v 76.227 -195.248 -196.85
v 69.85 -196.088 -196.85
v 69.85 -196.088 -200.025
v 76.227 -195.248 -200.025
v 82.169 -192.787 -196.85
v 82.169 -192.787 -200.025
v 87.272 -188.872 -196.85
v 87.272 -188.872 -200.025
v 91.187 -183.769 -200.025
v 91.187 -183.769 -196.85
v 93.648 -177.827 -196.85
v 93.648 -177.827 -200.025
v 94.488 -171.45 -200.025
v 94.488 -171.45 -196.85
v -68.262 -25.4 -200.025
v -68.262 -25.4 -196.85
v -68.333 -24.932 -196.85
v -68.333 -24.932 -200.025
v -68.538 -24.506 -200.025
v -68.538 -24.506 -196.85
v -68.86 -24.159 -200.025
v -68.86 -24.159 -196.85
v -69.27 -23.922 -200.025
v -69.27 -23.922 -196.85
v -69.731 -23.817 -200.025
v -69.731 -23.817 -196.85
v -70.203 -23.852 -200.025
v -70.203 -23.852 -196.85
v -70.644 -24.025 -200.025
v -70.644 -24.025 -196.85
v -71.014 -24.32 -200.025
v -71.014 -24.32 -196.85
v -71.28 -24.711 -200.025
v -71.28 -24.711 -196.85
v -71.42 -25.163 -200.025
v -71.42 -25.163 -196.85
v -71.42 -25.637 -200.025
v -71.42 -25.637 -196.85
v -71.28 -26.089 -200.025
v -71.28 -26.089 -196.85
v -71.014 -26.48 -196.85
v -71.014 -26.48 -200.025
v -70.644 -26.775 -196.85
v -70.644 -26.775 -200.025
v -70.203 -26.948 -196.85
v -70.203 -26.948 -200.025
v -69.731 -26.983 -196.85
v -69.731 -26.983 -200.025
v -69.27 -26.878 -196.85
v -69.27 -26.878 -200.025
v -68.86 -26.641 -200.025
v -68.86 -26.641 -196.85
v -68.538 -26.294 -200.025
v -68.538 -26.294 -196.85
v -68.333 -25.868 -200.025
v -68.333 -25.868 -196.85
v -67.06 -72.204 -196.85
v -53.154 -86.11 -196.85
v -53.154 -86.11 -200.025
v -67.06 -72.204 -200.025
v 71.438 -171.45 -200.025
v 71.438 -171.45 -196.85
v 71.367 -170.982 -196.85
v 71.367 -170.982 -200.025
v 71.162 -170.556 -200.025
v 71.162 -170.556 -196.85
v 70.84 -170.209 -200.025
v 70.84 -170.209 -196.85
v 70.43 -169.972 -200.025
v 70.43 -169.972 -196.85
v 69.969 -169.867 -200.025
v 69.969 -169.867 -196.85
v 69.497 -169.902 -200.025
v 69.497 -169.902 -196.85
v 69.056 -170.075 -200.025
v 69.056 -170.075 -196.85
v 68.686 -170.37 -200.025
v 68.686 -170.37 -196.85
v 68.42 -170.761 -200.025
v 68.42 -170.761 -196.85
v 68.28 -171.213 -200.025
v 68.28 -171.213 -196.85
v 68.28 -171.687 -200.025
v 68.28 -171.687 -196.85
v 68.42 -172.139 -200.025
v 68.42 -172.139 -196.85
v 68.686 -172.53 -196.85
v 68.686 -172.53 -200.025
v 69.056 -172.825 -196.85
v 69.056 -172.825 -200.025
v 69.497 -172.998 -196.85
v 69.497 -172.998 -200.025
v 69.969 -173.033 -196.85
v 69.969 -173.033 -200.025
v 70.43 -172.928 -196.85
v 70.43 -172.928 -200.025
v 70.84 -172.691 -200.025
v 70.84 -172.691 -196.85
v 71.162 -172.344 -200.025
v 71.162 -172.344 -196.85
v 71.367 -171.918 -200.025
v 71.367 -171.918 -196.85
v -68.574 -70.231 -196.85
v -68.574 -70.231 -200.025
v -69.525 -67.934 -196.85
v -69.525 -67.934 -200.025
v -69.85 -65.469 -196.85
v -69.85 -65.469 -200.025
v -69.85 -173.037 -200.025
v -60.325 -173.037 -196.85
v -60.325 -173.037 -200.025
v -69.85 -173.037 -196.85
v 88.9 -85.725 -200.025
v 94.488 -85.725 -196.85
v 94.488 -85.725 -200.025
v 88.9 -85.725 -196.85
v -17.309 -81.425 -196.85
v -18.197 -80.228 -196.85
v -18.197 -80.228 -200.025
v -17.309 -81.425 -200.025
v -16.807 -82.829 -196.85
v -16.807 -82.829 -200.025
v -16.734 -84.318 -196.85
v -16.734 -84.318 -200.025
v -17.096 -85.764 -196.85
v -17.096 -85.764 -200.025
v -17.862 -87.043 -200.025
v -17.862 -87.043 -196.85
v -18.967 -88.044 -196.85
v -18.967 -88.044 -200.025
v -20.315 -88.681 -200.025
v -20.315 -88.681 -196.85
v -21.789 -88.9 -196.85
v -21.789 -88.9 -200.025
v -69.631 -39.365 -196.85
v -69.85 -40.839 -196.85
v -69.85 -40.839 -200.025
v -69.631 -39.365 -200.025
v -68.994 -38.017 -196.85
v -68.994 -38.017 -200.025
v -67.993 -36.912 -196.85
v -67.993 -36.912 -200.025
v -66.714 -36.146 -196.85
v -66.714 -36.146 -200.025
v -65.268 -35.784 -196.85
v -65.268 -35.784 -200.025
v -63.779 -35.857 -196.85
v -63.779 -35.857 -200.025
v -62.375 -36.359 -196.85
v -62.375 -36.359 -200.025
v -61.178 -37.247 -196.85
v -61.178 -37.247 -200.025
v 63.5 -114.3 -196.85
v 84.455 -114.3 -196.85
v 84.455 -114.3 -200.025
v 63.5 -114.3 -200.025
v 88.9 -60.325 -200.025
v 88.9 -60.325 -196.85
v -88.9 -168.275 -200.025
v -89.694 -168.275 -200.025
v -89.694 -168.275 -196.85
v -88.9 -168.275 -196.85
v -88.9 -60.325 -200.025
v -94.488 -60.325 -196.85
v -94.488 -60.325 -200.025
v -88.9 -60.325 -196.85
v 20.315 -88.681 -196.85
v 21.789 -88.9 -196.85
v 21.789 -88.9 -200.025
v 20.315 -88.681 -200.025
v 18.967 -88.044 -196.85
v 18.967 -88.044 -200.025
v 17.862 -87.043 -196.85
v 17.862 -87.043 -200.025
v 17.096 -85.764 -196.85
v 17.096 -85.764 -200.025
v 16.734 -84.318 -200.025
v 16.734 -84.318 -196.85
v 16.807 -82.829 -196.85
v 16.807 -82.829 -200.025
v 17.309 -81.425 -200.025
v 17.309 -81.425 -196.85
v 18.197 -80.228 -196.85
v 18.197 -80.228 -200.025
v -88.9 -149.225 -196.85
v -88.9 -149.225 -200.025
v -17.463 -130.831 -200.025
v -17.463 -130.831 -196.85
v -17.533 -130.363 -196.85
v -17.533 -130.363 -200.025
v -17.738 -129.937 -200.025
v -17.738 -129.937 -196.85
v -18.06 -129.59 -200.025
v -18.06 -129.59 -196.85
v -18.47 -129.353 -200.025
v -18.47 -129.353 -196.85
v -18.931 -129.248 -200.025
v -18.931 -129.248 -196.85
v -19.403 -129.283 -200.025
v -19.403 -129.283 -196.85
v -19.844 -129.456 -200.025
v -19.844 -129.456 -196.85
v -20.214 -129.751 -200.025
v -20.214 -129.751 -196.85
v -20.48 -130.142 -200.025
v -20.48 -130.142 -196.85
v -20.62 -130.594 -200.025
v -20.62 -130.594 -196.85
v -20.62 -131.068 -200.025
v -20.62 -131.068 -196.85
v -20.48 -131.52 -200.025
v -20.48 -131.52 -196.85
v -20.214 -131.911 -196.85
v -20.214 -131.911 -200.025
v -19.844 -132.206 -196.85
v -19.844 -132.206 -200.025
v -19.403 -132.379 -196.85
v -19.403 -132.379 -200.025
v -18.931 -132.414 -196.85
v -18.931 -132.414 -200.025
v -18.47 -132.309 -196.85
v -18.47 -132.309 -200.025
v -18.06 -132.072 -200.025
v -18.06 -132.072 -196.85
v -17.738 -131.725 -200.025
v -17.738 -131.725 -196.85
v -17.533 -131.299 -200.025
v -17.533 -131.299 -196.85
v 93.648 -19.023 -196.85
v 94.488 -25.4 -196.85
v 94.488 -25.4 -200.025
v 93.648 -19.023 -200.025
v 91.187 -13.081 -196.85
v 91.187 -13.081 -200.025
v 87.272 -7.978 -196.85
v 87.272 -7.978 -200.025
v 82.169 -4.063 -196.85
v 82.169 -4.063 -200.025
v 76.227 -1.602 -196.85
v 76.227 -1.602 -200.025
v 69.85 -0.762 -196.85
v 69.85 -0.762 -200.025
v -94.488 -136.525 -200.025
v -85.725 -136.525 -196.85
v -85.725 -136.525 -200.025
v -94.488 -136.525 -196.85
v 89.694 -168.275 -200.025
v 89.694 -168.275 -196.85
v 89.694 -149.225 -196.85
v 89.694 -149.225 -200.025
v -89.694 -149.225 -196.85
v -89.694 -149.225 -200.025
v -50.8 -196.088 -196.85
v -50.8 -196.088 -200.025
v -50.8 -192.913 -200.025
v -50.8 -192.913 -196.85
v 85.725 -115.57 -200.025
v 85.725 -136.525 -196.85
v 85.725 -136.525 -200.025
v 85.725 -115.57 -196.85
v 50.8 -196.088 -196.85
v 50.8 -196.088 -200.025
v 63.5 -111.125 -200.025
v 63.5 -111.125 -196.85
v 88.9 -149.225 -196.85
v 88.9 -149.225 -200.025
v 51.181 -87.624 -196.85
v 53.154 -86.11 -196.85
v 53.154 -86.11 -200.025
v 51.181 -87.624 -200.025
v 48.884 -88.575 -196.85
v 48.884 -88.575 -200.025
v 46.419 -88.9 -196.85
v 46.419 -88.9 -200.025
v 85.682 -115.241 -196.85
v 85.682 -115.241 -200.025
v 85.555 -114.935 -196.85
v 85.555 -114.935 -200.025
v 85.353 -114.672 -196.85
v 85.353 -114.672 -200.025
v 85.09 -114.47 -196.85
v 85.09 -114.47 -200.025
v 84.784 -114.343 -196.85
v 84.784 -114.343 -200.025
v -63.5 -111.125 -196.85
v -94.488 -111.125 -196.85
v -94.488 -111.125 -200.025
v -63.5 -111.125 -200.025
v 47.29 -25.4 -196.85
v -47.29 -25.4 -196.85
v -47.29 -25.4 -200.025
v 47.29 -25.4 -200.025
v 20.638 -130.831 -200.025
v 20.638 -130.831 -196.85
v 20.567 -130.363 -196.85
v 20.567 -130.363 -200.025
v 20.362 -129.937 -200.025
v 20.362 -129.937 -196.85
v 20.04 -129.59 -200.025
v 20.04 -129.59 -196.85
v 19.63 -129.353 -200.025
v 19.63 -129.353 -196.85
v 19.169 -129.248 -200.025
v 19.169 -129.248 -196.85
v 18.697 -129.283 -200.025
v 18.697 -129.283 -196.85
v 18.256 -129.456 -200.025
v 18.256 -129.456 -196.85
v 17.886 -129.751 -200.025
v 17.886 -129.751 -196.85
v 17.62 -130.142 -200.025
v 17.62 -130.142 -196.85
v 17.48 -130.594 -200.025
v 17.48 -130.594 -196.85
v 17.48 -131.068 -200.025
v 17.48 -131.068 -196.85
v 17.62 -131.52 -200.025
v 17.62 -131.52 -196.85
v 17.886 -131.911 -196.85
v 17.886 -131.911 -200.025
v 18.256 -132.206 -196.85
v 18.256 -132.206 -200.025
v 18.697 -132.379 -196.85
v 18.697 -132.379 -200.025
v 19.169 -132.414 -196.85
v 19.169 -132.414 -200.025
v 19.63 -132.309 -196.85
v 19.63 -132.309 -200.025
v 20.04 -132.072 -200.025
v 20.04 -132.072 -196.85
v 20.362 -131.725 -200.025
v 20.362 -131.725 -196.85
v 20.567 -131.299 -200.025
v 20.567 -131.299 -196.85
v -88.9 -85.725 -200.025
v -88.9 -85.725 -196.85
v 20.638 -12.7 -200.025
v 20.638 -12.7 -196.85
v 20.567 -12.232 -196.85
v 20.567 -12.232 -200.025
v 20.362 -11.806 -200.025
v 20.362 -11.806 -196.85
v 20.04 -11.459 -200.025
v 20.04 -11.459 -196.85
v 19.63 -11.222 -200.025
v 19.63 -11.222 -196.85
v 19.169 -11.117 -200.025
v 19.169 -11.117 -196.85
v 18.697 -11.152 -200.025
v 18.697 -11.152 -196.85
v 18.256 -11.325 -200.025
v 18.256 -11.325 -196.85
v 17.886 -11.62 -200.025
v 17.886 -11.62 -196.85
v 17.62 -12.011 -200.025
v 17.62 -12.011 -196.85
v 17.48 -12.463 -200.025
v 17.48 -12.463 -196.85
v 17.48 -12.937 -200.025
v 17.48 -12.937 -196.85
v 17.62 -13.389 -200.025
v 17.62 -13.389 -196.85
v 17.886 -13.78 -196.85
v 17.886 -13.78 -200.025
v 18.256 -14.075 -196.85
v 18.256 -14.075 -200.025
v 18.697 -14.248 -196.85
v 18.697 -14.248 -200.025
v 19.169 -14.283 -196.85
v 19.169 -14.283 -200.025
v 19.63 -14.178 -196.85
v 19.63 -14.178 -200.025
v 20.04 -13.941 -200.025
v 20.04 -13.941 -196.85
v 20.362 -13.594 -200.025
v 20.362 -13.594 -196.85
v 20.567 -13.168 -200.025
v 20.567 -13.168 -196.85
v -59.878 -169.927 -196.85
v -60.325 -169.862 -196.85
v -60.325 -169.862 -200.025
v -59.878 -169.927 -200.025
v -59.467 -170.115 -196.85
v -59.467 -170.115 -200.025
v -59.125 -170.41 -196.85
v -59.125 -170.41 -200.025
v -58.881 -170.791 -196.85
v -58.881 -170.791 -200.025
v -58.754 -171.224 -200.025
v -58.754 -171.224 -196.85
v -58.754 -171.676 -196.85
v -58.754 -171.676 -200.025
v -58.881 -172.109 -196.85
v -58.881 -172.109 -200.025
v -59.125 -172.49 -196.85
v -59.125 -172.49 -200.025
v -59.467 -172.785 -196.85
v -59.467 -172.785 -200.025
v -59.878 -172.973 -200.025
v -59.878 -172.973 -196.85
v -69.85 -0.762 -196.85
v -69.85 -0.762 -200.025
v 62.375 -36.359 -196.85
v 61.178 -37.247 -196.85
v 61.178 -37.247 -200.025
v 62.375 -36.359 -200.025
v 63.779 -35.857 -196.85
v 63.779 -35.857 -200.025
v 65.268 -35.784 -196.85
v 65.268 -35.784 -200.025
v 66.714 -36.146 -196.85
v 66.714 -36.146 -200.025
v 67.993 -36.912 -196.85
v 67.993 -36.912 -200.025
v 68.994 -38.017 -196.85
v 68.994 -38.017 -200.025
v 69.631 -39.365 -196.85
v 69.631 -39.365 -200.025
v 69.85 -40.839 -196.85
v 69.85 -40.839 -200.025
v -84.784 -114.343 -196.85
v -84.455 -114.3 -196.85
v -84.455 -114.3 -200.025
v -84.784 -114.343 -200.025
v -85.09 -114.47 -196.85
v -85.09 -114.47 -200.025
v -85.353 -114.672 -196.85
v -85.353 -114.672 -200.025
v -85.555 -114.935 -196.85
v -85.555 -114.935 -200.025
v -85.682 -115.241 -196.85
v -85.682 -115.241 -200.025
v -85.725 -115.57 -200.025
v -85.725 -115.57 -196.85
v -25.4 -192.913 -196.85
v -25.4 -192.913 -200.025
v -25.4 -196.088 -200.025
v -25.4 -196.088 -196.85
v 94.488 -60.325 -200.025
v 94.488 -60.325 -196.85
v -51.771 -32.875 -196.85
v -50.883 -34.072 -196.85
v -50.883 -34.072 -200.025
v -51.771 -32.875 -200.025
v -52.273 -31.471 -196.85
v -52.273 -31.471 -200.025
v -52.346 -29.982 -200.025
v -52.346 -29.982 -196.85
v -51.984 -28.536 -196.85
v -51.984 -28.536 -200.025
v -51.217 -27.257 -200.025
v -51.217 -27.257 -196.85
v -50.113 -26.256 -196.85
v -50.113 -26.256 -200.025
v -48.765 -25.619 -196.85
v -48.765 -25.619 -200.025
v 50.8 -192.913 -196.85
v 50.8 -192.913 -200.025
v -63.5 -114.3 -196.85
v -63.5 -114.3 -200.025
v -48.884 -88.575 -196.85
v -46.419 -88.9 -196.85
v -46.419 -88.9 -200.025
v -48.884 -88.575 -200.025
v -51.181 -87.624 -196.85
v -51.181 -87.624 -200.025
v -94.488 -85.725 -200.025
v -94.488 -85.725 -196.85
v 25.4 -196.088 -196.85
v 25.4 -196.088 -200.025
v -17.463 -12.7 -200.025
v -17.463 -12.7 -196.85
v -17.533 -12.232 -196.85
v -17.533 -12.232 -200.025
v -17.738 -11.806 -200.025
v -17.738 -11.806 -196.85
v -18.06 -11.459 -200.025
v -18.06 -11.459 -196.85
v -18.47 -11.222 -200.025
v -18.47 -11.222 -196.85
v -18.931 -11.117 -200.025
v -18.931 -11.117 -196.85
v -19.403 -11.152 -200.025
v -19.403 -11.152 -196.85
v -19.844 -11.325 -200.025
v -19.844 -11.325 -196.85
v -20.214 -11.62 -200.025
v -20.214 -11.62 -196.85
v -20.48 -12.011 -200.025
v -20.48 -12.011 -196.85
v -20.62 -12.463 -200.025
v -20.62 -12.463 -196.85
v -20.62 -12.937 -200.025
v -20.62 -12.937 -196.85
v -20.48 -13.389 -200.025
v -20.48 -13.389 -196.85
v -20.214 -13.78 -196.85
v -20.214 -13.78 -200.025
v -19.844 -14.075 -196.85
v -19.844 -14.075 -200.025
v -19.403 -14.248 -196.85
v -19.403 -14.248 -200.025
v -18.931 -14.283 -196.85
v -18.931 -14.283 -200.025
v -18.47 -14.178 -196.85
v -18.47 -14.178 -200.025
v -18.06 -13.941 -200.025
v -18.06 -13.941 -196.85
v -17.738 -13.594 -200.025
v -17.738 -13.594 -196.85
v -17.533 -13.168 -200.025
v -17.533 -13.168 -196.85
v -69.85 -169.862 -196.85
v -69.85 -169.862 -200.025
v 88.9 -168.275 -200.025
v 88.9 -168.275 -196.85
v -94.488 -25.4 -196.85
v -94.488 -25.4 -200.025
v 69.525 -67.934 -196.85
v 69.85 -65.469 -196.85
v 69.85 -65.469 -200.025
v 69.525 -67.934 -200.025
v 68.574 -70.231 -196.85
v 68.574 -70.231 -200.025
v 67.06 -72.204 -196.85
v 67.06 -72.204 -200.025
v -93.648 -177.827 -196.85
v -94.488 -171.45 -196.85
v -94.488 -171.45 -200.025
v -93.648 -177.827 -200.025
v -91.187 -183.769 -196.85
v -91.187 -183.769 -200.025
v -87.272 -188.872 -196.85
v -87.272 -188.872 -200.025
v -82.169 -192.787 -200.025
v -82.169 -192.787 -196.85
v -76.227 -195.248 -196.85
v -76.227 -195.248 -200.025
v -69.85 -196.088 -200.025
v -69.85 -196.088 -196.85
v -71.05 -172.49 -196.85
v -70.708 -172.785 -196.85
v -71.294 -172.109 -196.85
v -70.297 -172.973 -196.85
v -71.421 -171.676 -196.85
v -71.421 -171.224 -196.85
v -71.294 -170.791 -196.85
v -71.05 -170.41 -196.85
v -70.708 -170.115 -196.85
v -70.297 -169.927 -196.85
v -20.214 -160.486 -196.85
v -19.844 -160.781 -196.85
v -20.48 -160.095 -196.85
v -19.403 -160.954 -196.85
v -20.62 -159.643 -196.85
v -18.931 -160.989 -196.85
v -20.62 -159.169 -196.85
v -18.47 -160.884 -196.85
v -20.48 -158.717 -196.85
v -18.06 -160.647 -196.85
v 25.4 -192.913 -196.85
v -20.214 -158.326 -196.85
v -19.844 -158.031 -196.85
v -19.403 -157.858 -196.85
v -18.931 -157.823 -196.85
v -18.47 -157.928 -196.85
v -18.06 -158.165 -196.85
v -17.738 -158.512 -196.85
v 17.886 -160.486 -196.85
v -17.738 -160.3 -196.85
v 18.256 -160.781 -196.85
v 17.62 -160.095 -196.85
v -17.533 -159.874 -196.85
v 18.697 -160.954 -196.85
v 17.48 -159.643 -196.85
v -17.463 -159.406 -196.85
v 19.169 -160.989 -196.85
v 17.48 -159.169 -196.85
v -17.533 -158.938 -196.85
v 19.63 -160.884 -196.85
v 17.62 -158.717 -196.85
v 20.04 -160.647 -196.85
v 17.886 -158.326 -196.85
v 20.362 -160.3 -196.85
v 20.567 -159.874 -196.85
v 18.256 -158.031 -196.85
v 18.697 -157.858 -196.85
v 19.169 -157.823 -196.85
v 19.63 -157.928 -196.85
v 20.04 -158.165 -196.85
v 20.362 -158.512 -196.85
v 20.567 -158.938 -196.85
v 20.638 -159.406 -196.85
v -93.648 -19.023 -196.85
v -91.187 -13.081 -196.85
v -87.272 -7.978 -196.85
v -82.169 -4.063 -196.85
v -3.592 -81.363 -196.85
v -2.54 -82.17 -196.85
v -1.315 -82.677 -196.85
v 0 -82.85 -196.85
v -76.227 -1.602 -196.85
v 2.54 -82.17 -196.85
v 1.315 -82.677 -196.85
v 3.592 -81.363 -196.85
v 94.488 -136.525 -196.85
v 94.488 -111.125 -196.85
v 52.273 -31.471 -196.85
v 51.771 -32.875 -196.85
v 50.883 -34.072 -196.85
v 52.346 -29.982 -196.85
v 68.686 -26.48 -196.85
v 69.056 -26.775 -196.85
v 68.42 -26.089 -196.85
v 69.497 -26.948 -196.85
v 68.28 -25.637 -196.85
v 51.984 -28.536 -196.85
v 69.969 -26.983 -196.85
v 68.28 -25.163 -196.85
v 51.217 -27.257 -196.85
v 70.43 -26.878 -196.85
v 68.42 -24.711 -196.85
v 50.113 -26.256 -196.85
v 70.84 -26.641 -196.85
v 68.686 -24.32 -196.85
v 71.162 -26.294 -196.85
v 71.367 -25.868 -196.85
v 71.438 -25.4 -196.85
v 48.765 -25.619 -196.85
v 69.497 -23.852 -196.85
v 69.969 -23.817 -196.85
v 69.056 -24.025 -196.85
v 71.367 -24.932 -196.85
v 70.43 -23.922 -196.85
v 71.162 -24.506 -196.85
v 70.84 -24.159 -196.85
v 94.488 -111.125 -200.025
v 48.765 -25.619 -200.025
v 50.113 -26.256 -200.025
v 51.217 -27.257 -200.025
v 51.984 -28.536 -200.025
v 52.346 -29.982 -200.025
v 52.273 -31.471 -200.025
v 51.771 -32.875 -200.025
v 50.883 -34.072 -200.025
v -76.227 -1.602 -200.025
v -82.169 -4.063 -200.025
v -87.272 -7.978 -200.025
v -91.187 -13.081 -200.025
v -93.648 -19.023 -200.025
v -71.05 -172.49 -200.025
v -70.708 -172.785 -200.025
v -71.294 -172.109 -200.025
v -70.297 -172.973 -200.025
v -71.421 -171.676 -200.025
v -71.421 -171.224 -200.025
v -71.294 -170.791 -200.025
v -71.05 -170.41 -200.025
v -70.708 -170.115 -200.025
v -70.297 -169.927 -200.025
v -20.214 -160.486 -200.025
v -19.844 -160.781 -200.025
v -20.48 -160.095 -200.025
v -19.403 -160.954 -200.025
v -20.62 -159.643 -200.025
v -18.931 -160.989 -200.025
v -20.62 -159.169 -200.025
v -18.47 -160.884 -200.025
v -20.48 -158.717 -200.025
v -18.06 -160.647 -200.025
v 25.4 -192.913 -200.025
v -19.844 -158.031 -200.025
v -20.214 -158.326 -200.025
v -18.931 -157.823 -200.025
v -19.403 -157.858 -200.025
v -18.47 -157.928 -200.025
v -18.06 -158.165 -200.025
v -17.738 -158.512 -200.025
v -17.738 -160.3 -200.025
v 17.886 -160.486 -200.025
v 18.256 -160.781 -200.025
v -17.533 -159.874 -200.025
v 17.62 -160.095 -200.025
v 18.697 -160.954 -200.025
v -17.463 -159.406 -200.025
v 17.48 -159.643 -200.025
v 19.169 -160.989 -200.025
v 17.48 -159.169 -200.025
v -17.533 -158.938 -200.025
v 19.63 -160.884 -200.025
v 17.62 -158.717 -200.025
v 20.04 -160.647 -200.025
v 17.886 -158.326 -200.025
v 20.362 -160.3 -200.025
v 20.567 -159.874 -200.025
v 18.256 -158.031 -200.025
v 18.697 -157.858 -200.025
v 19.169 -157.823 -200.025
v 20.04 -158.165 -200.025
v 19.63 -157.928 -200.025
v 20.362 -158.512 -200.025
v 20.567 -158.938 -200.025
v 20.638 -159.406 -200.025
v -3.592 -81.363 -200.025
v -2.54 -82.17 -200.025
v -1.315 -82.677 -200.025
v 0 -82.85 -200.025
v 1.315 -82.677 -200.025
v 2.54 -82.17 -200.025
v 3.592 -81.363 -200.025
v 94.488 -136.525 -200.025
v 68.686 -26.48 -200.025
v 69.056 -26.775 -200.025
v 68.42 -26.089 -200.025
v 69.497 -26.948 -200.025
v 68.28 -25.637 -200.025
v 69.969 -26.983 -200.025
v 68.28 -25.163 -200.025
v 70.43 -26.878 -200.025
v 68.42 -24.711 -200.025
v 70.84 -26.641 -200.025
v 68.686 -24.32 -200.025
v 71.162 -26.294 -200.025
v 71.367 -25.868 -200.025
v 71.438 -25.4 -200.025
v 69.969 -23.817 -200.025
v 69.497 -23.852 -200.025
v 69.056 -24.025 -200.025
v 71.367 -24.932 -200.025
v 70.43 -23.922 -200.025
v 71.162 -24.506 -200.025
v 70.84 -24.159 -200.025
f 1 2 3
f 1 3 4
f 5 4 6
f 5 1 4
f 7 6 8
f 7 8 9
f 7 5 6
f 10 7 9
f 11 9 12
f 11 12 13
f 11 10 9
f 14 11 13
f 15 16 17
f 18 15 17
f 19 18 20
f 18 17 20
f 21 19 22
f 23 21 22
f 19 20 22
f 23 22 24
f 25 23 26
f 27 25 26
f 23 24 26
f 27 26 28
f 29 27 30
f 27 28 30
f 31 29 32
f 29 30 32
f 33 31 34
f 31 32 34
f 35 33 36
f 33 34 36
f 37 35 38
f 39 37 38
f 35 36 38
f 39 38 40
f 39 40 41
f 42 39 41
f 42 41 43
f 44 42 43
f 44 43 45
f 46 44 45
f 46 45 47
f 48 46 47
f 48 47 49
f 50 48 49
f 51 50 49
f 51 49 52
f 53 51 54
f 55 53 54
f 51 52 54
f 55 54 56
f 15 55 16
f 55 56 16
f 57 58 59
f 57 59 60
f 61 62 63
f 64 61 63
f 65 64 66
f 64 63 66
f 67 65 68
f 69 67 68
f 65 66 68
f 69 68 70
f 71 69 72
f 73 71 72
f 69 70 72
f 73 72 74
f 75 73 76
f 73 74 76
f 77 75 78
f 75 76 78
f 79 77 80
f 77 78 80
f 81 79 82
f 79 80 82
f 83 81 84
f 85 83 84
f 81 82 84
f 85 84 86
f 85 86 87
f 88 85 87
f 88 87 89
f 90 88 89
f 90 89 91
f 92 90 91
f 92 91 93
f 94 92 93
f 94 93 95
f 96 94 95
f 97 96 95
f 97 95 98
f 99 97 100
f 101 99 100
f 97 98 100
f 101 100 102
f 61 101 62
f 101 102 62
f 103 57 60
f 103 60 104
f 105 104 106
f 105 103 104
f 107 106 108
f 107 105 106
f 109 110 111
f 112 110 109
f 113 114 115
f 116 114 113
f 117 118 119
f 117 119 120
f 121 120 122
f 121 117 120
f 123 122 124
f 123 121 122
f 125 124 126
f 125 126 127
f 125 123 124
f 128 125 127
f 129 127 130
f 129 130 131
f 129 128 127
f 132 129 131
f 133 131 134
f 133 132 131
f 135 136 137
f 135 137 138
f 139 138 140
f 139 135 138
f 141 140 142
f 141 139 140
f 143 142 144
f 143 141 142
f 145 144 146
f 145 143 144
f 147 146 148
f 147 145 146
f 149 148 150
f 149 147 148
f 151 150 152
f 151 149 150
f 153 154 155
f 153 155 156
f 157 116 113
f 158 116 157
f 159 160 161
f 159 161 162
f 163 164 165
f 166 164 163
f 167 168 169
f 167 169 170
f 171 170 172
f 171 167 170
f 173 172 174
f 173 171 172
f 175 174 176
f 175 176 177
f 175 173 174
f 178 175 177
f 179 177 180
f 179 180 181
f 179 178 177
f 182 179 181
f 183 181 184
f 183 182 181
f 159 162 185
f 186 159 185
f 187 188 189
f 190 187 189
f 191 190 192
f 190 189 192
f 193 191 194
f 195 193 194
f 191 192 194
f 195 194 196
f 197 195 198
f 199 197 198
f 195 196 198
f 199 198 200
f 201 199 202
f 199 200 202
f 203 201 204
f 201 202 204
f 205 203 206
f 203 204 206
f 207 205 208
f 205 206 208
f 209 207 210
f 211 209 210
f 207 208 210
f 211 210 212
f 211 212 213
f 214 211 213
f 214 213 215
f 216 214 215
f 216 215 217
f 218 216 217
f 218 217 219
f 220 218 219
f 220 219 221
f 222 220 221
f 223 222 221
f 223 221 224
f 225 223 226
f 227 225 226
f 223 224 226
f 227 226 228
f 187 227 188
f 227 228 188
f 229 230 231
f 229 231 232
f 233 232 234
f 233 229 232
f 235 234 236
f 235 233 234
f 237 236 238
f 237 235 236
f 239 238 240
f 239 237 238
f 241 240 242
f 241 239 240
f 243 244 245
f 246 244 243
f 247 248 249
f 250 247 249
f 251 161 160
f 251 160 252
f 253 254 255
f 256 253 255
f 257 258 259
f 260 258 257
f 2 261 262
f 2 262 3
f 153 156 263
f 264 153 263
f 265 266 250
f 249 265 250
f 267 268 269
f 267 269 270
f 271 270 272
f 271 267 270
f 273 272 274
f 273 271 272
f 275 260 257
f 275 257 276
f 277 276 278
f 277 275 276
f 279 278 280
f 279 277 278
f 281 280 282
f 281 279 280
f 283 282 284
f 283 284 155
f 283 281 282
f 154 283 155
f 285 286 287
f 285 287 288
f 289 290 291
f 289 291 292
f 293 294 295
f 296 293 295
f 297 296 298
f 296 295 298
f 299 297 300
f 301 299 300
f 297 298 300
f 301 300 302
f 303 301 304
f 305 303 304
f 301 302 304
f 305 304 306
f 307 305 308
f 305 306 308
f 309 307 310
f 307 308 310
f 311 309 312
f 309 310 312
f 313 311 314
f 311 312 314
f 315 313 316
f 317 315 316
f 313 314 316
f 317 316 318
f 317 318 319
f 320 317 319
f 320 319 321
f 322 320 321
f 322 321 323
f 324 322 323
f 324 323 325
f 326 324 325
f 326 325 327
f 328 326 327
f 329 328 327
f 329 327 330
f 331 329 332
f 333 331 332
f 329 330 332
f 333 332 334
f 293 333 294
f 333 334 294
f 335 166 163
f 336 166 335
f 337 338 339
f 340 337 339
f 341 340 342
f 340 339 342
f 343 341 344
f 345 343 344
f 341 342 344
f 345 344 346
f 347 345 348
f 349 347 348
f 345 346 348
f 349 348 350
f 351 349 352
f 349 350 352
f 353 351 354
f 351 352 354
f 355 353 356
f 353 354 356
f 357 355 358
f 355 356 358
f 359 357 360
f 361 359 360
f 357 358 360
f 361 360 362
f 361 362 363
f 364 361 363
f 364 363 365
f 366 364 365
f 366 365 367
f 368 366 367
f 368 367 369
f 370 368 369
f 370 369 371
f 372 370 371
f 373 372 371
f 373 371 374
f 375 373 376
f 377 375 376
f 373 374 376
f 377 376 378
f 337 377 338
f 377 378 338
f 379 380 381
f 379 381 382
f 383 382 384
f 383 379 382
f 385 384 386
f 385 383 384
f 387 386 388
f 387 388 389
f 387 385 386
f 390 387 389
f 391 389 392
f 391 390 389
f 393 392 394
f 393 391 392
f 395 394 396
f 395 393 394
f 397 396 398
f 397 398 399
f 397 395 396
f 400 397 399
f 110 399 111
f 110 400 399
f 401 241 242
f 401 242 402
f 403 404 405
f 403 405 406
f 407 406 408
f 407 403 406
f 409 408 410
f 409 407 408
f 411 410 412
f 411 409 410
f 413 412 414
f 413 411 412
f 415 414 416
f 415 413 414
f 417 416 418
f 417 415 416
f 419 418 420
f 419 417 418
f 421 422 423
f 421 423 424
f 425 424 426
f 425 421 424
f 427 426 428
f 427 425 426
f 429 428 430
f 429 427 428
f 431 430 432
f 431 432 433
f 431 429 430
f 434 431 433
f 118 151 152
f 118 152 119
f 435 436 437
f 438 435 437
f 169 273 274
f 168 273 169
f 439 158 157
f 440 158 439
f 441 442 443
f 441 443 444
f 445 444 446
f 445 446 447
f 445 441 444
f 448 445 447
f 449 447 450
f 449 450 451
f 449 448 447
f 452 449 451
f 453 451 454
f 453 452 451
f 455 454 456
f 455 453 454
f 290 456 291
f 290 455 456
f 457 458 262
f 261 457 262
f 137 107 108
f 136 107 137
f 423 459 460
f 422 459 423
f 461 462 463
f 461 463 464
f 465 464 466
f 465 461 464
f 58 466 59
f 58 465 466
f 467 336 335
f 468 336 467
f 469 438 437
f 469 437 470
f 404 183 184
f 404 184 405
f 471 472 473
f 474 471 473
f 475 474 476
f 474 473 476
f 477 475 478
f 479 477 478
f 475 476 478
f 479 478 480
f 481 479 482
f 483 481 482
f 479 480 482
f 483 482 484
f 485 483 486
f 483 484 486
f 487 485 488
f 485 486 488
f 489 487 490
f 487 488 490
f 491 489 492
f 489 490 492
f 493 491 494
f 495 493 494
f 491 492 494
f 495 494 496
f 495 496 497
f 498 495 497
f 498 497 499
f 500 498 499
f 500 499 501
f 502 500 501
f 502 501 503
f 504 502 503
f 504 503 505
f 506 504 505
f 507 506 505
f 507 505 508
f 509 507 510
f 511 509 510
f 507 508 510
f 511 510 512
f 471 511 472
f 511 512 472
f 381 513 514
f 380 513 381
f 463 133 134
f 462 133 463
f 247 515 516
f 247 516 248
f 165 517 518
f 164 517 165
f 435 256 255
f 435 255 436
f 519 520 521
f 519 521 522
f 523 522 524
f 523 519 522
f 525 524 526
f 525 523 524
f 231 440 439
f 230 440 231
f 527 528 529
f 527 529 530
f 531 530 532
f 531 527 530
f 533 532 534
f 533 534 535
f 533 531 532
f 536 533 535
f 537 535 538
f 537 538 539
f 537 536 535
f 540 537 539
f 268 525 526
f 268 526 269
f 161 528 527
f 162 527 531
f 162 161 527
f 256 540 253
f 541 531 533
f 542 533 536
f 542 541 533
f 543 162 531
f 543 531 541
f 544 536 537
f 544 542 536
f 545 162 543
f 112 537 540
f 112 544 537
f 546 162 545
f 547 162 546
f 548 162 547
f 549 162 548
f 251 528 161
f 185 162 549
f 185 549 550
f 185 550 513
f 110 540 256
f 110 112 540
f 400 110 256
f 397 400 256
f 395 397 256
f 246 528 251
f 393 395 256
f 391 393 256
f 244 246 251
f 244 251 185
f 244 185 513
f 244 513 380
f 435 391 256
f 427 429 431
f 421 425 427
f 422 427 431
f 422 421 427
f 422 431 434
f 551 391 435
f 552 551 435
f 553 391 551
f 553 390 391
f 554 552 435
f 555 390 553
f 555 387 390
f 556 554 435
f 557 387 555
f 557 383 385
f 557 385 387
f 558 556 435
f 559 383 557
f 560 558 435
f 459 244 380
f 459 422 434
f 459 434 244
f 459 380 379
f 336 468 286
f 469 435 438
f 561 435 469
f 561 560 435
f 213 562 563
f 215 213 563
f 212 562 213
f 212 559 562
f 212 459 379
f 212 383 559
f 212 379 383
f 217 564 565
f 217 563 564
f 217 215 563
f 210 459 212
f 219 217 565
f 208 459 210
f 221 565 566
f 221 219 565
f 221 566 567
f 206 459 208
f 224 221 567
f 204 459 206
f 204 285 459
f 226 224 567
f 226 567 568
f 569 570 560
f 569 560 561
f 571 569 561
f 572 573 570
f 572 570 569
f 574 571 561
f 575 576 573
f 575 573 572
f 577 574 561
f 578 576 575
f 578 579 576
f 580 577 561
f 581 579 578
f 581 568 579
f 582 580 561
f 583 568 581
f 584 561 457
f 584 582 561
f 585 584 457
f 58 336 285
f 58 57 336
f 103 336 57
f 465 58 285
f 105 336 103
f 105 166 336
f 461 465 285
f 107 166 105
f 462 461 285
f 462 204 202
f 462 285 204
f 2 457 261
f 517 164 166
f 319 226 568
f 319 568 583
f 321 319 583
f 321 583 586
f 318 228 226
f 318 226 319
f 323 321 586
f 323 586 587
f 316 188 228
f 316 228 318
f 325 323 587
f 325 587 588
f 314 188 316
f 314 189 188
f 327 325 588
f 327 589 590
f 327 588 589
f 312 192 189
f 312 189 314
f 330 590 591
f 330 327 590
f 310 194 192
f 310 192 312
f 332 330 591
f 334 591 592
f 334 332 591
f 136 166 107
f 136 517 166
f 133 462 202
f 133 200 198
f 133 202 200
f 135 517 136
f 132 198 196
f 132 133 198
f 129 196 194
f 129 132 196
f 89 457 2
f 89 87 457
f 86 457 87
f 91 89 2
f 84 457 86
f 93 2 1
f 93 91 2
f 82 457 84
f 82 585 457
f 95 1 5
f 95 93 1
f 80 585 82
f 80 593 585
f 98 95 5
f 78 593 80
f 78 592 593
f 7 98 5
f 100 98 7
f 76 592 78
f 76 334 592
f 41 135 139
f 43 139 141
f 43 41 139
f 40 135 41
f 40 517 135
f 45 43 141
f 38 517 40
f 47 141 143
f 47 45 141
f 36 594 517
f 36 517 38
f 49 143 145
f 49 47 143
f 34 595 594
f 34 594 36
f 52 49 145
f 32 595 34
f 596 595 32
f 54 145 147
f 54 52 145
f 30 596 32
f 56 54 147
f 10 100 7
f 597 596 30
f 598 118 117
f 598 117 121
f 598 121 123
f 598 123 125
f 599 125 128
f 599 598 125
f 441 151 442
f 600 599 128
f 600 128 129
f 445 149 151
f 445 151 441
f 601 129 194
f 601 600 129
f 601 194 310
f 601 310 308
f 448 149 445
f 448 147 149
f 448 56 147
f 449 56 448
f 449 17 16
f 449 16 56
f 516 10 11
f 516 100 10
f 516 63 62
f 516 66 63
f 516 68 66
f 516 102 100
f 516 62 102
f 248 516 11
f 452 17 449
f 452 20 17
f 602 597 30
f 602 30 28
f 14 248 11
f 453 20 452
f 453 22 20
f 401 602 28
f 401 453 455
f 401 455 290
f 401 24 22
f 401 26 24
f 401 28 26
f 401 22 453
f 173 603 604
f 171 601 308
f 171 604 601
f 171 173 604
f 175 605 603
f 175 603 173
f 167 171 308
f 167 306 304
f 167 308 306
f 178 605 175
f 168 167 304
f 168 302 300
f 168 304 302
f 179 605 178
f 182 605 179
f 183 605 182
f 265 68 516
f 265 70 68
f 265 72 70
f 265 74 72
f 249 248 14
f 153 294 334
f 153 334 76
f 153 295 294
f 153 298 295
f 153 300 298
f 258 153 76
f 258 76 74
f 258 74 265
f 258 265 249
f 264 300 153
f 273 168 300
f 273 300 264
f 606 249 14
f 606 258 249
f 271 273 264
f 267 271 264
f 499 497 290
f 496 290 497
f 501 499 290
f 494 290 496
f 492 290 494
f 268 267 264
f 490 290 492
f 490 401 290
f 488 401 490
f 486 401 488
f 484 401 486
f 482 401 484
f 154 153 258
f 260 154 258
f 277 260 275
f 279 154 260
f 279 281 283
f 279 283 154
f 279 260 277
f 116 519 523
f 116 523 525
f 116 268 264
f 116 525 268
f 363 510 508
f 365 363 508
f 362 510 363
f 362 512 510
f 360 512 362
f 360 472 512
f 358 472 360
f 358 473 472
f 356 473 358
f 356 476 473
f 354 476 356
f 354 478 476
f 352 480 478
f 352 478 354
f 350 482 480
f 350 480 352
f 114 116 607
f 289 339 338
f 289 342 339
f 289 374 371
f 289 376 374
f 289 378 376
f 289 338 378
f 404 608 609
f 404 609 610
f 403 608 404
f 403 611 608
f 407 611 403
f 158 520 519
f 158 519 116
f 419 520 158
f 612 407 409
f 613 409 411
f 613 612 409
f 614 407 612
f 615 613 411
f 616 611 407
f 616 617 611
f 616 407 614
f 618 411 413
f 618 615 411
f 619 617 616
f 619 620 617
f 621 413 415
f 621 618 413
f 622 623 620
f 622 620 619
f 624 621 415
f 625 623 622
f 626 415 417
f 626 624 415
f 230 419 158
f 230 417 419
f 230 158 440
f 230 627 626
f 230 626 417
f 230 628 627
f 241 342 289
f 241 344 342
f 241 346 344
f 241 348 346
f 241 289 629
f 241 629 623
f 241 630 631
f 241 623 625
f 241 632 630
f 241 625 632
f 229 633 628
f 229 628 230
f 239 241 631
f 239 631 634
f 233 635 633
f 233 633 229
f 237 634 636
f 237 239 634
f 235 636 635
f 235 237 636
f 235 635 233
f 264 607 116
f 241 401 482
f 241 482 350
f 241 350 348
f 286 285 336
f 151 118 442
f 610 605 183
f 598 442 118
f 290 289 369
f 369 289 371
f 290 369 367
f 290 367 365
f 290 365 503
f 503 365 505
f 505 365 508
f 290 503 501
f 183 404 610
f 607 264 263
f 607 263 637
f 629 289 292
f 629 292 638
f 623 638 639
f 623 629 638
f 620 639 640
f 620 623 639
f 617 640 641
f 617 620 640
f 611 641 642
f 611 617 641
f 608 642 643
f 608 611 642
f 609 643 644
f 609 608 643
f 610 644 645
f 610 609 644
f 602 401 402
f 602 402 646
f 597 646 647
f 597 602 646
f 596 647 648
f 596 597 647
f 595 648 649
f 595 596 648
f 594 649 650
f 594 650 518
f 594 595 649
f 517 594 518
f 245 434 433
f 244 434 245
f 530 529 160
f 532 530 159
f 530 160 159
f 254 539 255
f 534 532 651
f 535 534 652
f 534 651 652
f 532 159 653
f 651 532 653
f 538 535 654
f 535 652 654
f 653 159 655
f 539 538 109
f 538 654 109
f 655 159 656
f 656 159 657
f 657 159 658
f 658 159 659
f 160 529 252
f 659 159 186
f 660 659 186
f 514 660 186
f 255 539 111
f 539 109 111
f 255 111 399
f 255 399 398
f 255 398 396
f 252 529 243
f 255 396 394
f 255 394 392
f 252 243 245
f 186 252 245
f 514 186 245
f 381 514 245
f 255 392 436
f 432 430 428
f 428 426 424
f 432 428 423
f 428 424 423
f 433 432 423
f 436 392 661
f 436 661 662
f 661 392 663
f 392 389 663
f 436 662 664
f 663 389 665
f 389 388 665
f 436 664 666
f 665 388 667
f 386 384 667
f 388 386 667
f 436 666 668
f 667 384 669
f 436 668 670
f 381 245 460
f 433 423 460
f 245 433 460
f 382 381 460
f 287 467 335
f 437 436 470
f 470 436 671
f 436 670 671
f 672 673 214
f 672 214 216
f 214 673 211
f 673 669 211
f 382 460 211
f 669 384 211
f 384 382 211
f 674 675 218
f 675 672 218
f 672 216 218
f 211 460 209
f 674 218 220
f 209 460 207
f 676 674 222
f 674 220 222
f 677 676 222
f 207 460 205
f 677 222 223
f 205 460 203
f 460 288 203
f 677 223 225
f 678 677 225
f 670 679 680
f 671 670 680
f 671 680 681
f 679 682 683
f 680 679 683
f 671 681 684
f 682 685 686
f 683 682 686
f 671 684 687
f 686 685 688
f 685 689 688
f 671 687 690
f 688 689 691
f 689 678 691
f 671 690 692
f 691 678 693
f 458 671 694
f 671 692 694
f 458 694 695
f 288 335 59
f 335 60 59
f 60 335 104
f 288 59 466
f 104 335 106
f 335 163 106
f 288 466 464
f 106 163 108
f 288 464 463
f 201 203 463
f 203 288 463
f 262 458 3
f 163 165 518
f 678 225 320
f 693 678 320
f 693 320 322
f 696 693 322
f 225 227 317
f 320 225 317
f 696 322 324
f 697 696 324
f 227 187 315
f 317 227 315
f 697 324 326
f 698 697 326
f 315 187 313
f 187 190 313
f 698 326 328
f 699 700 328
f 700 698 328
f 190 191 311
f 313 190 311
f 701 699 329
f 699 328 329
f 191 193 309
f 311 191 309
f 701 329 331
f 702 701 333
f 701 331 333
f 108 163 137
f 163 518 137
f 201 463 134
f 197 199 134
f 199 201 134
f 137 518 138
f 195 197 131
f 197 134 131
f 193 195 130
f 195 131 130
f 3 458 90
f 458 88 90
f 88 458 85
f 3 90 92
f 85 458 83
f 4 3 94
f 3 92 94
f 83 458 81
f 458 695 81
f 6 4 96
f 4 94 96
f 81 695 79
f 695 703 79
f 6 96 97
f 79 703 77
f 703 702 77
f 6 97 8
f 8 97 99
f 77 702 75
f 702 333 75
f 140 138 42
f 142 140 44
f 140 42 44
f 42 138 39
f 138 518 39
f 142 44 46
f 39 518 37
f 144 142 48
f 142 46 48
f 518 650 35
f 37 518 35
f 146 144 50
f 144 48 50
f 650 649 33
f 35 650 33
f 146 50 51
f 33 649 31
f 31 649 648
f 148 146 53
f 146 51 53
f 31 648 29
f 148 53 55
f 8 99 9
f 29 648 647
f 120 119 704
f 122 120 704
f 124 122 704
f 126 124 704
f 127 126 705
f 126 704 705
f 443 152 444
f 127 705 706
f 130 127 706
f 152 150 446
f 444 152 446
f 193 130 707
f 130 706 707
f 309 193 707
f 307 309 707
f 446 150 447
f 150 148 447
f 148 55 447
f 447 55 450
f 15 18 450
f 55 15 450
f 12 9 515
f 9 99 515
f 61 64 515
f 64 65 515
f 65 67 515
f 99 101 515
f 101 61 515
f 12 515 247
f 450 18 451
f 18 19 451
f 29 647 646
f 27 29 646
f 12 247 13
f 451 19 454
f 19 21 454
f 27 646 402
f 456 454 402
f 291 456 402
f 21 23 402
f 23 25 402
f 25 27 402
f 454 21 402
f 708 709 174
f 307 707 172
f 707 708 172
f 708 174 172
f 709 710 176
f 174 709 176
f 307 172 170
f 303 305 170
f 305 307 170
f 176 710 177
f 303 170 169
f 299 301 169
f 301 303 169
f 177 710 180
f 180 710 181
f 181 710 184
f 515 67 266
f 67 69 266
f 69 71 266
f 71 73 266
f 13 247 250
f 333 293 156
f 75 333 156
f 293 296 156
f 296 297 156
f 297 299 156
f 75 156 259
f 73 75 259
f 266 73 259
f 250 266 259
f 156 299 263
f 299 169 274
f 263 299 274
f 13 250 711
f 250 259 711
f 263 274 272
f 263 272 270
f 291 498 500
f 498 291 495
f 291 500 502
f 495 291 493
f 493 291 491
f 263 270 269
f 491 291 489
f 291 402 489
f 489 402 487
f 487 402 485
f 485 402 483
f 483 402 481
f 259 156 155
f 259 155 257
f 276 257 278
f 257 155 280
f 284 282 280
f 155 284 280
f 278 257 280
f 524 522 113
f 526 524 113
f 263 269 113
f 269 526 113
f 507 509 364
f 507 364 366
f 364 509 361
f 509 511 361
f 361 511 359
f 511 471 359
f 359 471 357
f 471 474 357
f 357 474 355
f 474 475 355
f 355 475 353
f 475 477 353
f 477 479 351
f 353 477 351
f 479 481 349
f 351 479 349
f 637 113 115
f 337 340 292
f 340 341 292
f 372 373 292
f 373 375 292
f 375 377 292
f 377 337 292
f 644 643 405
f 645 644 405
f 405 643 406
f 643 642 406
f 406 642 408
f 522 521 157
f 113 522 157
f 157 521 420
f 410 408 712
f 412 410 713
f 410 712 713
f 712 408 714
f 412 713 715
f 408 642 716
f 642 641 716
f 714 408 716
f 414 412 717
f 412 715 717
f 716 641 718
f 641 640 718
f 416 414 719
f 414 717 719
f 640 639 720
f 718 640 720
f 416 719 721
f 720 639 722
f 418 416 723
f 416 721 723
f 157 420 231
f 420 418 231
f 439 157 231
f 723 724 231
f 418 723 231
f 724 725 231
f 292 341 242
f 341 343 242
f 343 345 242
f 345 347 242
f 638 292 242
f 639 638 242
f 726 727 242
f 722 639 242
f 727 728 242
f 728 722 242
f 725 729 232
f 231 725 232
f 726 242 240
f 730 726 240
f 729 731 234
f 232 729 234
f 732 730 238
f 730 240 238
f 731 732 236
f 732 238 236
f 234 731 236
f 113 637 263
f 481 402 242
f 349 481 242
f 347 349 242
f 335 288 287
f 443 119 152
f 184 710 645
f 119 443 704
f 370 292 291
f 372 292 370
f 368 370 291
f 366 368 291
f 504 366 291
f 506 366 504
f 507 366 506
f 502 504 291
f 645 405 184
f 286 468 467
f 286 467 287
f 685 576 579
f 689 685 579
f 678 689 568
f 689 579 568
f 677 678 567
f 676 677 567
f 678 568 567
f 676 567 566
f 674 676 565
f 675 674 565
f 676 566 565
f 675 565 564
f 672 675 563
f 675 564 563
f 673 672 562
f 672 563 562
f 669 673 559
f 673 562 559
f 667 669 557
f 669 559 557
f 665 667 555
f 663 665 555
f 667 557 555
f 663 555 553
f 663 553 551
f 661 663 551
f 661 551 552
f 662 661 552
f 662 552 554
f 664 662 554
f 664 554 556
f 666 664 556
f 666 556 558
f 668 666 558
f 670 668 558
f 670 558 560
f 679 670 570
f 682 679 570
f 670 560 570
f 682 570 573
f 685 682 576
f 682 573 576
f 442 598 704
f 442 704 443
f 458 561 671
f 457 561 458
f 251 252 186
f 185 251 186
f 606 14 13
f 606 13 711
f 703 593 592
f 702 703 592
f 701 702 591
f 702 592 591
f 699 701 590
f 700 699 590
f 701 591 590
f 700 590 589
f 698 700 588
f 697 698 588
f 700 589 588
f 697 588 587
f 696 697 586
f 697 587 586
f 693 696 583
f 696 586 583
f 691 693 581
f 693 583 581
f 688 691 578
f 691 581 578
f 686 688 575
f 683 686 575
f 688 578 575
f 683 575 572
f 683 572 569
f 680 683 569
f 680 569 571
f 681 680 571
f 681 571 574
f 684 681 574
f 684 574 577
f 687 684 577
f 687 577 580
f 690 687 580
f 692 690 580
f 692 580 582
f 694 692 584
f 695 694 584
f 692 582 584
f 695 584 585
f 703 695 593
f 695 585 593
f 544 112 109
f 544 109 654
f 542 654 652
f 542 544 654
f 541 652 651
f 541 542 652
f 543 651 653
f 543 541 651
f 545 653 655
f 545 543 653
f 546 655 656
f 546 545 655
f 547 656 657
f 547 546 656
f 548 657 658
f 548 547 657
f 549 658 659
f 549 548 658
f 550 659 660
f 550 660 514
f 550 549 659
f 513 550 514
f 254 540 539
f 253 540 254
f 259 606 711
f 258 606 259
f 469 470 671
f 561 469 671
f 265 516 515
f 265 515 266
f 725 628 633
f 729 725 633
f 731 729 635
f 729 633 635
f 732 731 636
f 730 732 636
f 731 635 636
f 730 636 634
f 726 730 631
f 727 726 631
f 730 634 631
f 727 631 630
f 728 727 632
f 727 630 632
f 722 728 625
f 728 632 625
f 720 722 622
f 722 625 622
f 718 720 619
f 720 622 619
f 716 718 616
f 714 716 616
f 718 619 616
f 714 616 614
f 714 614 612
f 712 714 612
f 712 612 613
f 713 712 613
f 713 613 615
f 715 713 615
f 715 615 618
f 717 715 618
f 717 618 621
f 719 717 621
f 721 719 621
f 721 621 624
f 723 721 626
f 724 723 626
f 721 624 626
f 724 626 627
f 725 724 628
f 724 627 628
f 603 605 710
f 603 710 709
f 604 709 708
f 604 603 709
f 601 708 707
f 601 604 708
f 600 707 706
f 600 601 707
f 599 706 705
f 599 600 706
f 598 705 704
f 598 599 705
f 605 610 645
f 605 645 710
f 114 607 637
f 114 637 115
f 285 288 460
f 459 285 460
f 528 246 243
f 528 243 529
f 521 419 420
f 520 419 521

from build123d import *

# Parameters (mm, degrees)
SKETCH1_W           = 0.79375
SKETCH1_H           = 19.05
SKETCH1_R           = 1.5875
BOSS_EXTRUDE1_DEPTH = 3.175


with BuildPart() as part:
    # Sketch1 → Boss-Extrude1 (new body)
    with BuildSketch(Plane.XY.offset(-196.85)):
        with BuildLine():
            Line((-85.725, -136.525), (-94.488, -136.525))
            Line((-94.488, -136.525), (-94.488, -171.45))
            ThreePointArc((-94.488, -171.45), (-87.271696875, -188.871696875), (-69.85, -196.088))
            Line((-69.85, -196.088), (-50.8, -196.088))
            Line((-50.8, -196.088), (-50.8, -192.913))
            Line((-50.8, -192.913), (-25.4, -192.913))
            Line((-25.4, -192.913), (-25.4, -196.088))
            Line((-25.4, -196.088), (25.4, -196.088))
            Line((25.4, -196.088), (25.4, -192.913))
            Line((25.4, -192.913), (50.8, -192.913))
            Line((50.8, -192.913), (50.8, -196.088))
            Line((50.8, -196.088), (69.85, -196.088))
            ThreePointArc((69.85, -196.088), (87.271696875, -188.871696875), (94.488, -171.45))
            Line((94.488, -171.45), (94.488, -136.525))
            Line((94.488, -136.525), (85.725, -136.525))
            Line((85.725, -136.525), (85.725, -115.57))
            ThreePointArc((85.725, -115.57), (85.353025612, -114.671974388), (84.455, -114.3))
            Line((84.455, -114.3), (63.5, -114.3))
            Line((63.5, -114.3), (63.5, -111.125))
            Line((63.5, -111.125), (94.488, -111.125))
            Line((94.488, -111.125), (94.488, -85.725))
            Line((94.488, -85.725), (88.9, -85.725))
            Line((88.9, -85.725), (88.9, -60.325))
            Line((88.9, -60.325), (94.488, -60.325))
            Line((94.488, -60.325), (94.488, -25.4))
            ThreePointArc((94.488, -25.4), (87.271696875, -7.978303125), (69.85, -0.762))
            Line((69.85, -0.762), (-69.85, -0.762))
            ThreePointArc((-69.85, -0.762), (-87.271696875, -7.978303125), (-94.488, -25.4))
            Line((-94.488, -25.4), (-94.488, -60.325))
            Line((-94.488, -60.325), (-88.9, -60.325))
            Line((-88.9, -60.325), (-88.9, -85.725))
            Line((-88.9, -85.725), (-94.488, -85.725))
            Line((-94.488, -85.725), (-94.488, -111.125))
            Line((-94.488, -111.125), (-63.5, -111.125))
            Line((-63.5, -111.125), (-63.5, -114.3))
            Line((-63.5, -114.3), (-84.455, -114.3))
            ThreePointArc((-84.455, -114.3), (-85.353025612, -114.671974388), (-85.725, -115.57))
            Line((-85.725, -115.57), (-85.725, -136.525))
        make_face()
        with Locations((-89.296875, -158.75)):
            Rectangle(SKETCH1_W, SKETCH1_H, mode=Mode.SUBTRACT)
        with BuildLine():
            ThreePointArc((-69.85, -173.0375), (-71.4375, -171.45), (-69.85, -169.8625))
            Line((-69.85, -169.8625), (-60.325, -169.8625))
            ThreePointArc((-60.325, -169.8625), (-58.7375, -171.45), (-60.325, -173.0375))
            Line((-60.325, -173.0375), (-69.85, -173.0375))
        make_face(mode=Mode.SUBTRACT)
        with Locations((-19.05, -159.40600326)):
            Circle(SKETCH1_R, mode=Mode.SUBTRACT)
        with Locations((-19.05, -130.83100326)):
            Circle(SKETCH1_R, mode=Mode.SUBTRACT)
        with Locations((19.05, -159.40600326)):
            Circle(SKETCH1_R, mode=Mode.SUBTRACT)
        with Locations((69.85, -171.45)):
            Circle(SKETCH1_R, mode=Mode.SUBTRACT)
        with Locations((89.296875, -158.75)):
            Rectangle(SKETCH1_W, SKETCH1_H, mode=Mode.SUBTRACT)
        with Locations((19.05, -130.83100326)):
            Circle(SKETCH1_R, mode=Mode.SUBTRACT)
        with BuildLine():
            ThreePointArc((-67.060192091, -72.204012806), (-69.124952547, -69.113880409), (-69.85, -65.468820715))
            Line((-69.85, -65.468820715), (-69.85, -40.839204897))
            ThreePointArc((-69.85, -40.839204897), (-66.714031836, -36.145896872), (-61.177897552, -37.247102448))
            Line((-61.177897552, -37.247102448), (-18.197102448, -80.227897552))
            ThreePointArc((-18.197102448, -80.227897552), (-17.095896872, -85.764031836), (-21.789204897, -88.9))
            Line((-21.789204897, -88.9), (-46.418820715, -88.9))
            ThreePointArc((-46.418820715, -88.9), (-50.063880409, -88.174952547), (-53.154012806, -86.110192091))
            Line((-53.154012806, -86.110192091), (-67.060192091, -72.204012806))
        make_face(mode=Mode.SUBTRACT)
        with Locations((-69.85, -25.4)):
            Circle(SKETCH1_R, mode=Mode.SUBTRACT)
        with Locations((-19.05, -12.7)):
            Circle(SKETCH1_R, mode=Mode.SUBTRACT)
        with BuildLine():
            ThreePointArc((3.592102448, -81.36251337), (0, -82.850410922), (-3.592102448, -81.36251337))
            Line((-3.592102448, -81.36251337), (-50.88251337, -34.072102448))
            ThreePointArc((-50.88251337, -34.072102448), (-51.983718947, -28.535968164), (-47.290410922, -25.4))
            Line((-47.290410922, -25.4), (47.290410922, -25.4))
            ThreePointArc((47.290410922, -25.4), (51.983718947, -28.535968164), (50.88251337, -34.072102448))
            Line((50.88251337, -34.072102448), (3.592102448, -81.36251337))
        make_face(mode=Mode.SUBTRACT)
        with BuildLine():
            ThreePointArc((53.154012806, -86.110192091), (50.063880409, -88.174952547), (46.418820715, -88.9))
            Line((46.418820715, -88.9), (21.789204897, -88.9))
            ThreePointArc((21.789204897, -88.9), (17.095896872, -85.764031836), (18.197102448, -80.227897552))
            Line((18.197102448, -80.227897552), (61.177897552, -37.247102448))
            ThreePointArc((61.177897552, -37.247102448), (66.714031836, -36.145896872), (69.85, -40.839204897))
            Line((69.85, -40.839204897), (69.85, -65.468820715))
            ThreePointArc((69.85, -65.468820715), (69.124952547, -69.113880409), (67.060192091, -72.204012806))
            Line((67.060192091, -72.204012806), (53.154012806, -86.110192091))
        make_face(mode=Mode.SUBTRACT)
        with Locations((19.05, -12.7)):
            Circle(SKETCH1_R, mode=Mode.SUBTRACT)
        with Locations((69.85, -25.4)):
            Circle(SKETCH1_R, mode=Mode.SUBTRACT)
    extrude(amount=-BOSS_EXTRUDE1_DEPTH)


solid = part.part
